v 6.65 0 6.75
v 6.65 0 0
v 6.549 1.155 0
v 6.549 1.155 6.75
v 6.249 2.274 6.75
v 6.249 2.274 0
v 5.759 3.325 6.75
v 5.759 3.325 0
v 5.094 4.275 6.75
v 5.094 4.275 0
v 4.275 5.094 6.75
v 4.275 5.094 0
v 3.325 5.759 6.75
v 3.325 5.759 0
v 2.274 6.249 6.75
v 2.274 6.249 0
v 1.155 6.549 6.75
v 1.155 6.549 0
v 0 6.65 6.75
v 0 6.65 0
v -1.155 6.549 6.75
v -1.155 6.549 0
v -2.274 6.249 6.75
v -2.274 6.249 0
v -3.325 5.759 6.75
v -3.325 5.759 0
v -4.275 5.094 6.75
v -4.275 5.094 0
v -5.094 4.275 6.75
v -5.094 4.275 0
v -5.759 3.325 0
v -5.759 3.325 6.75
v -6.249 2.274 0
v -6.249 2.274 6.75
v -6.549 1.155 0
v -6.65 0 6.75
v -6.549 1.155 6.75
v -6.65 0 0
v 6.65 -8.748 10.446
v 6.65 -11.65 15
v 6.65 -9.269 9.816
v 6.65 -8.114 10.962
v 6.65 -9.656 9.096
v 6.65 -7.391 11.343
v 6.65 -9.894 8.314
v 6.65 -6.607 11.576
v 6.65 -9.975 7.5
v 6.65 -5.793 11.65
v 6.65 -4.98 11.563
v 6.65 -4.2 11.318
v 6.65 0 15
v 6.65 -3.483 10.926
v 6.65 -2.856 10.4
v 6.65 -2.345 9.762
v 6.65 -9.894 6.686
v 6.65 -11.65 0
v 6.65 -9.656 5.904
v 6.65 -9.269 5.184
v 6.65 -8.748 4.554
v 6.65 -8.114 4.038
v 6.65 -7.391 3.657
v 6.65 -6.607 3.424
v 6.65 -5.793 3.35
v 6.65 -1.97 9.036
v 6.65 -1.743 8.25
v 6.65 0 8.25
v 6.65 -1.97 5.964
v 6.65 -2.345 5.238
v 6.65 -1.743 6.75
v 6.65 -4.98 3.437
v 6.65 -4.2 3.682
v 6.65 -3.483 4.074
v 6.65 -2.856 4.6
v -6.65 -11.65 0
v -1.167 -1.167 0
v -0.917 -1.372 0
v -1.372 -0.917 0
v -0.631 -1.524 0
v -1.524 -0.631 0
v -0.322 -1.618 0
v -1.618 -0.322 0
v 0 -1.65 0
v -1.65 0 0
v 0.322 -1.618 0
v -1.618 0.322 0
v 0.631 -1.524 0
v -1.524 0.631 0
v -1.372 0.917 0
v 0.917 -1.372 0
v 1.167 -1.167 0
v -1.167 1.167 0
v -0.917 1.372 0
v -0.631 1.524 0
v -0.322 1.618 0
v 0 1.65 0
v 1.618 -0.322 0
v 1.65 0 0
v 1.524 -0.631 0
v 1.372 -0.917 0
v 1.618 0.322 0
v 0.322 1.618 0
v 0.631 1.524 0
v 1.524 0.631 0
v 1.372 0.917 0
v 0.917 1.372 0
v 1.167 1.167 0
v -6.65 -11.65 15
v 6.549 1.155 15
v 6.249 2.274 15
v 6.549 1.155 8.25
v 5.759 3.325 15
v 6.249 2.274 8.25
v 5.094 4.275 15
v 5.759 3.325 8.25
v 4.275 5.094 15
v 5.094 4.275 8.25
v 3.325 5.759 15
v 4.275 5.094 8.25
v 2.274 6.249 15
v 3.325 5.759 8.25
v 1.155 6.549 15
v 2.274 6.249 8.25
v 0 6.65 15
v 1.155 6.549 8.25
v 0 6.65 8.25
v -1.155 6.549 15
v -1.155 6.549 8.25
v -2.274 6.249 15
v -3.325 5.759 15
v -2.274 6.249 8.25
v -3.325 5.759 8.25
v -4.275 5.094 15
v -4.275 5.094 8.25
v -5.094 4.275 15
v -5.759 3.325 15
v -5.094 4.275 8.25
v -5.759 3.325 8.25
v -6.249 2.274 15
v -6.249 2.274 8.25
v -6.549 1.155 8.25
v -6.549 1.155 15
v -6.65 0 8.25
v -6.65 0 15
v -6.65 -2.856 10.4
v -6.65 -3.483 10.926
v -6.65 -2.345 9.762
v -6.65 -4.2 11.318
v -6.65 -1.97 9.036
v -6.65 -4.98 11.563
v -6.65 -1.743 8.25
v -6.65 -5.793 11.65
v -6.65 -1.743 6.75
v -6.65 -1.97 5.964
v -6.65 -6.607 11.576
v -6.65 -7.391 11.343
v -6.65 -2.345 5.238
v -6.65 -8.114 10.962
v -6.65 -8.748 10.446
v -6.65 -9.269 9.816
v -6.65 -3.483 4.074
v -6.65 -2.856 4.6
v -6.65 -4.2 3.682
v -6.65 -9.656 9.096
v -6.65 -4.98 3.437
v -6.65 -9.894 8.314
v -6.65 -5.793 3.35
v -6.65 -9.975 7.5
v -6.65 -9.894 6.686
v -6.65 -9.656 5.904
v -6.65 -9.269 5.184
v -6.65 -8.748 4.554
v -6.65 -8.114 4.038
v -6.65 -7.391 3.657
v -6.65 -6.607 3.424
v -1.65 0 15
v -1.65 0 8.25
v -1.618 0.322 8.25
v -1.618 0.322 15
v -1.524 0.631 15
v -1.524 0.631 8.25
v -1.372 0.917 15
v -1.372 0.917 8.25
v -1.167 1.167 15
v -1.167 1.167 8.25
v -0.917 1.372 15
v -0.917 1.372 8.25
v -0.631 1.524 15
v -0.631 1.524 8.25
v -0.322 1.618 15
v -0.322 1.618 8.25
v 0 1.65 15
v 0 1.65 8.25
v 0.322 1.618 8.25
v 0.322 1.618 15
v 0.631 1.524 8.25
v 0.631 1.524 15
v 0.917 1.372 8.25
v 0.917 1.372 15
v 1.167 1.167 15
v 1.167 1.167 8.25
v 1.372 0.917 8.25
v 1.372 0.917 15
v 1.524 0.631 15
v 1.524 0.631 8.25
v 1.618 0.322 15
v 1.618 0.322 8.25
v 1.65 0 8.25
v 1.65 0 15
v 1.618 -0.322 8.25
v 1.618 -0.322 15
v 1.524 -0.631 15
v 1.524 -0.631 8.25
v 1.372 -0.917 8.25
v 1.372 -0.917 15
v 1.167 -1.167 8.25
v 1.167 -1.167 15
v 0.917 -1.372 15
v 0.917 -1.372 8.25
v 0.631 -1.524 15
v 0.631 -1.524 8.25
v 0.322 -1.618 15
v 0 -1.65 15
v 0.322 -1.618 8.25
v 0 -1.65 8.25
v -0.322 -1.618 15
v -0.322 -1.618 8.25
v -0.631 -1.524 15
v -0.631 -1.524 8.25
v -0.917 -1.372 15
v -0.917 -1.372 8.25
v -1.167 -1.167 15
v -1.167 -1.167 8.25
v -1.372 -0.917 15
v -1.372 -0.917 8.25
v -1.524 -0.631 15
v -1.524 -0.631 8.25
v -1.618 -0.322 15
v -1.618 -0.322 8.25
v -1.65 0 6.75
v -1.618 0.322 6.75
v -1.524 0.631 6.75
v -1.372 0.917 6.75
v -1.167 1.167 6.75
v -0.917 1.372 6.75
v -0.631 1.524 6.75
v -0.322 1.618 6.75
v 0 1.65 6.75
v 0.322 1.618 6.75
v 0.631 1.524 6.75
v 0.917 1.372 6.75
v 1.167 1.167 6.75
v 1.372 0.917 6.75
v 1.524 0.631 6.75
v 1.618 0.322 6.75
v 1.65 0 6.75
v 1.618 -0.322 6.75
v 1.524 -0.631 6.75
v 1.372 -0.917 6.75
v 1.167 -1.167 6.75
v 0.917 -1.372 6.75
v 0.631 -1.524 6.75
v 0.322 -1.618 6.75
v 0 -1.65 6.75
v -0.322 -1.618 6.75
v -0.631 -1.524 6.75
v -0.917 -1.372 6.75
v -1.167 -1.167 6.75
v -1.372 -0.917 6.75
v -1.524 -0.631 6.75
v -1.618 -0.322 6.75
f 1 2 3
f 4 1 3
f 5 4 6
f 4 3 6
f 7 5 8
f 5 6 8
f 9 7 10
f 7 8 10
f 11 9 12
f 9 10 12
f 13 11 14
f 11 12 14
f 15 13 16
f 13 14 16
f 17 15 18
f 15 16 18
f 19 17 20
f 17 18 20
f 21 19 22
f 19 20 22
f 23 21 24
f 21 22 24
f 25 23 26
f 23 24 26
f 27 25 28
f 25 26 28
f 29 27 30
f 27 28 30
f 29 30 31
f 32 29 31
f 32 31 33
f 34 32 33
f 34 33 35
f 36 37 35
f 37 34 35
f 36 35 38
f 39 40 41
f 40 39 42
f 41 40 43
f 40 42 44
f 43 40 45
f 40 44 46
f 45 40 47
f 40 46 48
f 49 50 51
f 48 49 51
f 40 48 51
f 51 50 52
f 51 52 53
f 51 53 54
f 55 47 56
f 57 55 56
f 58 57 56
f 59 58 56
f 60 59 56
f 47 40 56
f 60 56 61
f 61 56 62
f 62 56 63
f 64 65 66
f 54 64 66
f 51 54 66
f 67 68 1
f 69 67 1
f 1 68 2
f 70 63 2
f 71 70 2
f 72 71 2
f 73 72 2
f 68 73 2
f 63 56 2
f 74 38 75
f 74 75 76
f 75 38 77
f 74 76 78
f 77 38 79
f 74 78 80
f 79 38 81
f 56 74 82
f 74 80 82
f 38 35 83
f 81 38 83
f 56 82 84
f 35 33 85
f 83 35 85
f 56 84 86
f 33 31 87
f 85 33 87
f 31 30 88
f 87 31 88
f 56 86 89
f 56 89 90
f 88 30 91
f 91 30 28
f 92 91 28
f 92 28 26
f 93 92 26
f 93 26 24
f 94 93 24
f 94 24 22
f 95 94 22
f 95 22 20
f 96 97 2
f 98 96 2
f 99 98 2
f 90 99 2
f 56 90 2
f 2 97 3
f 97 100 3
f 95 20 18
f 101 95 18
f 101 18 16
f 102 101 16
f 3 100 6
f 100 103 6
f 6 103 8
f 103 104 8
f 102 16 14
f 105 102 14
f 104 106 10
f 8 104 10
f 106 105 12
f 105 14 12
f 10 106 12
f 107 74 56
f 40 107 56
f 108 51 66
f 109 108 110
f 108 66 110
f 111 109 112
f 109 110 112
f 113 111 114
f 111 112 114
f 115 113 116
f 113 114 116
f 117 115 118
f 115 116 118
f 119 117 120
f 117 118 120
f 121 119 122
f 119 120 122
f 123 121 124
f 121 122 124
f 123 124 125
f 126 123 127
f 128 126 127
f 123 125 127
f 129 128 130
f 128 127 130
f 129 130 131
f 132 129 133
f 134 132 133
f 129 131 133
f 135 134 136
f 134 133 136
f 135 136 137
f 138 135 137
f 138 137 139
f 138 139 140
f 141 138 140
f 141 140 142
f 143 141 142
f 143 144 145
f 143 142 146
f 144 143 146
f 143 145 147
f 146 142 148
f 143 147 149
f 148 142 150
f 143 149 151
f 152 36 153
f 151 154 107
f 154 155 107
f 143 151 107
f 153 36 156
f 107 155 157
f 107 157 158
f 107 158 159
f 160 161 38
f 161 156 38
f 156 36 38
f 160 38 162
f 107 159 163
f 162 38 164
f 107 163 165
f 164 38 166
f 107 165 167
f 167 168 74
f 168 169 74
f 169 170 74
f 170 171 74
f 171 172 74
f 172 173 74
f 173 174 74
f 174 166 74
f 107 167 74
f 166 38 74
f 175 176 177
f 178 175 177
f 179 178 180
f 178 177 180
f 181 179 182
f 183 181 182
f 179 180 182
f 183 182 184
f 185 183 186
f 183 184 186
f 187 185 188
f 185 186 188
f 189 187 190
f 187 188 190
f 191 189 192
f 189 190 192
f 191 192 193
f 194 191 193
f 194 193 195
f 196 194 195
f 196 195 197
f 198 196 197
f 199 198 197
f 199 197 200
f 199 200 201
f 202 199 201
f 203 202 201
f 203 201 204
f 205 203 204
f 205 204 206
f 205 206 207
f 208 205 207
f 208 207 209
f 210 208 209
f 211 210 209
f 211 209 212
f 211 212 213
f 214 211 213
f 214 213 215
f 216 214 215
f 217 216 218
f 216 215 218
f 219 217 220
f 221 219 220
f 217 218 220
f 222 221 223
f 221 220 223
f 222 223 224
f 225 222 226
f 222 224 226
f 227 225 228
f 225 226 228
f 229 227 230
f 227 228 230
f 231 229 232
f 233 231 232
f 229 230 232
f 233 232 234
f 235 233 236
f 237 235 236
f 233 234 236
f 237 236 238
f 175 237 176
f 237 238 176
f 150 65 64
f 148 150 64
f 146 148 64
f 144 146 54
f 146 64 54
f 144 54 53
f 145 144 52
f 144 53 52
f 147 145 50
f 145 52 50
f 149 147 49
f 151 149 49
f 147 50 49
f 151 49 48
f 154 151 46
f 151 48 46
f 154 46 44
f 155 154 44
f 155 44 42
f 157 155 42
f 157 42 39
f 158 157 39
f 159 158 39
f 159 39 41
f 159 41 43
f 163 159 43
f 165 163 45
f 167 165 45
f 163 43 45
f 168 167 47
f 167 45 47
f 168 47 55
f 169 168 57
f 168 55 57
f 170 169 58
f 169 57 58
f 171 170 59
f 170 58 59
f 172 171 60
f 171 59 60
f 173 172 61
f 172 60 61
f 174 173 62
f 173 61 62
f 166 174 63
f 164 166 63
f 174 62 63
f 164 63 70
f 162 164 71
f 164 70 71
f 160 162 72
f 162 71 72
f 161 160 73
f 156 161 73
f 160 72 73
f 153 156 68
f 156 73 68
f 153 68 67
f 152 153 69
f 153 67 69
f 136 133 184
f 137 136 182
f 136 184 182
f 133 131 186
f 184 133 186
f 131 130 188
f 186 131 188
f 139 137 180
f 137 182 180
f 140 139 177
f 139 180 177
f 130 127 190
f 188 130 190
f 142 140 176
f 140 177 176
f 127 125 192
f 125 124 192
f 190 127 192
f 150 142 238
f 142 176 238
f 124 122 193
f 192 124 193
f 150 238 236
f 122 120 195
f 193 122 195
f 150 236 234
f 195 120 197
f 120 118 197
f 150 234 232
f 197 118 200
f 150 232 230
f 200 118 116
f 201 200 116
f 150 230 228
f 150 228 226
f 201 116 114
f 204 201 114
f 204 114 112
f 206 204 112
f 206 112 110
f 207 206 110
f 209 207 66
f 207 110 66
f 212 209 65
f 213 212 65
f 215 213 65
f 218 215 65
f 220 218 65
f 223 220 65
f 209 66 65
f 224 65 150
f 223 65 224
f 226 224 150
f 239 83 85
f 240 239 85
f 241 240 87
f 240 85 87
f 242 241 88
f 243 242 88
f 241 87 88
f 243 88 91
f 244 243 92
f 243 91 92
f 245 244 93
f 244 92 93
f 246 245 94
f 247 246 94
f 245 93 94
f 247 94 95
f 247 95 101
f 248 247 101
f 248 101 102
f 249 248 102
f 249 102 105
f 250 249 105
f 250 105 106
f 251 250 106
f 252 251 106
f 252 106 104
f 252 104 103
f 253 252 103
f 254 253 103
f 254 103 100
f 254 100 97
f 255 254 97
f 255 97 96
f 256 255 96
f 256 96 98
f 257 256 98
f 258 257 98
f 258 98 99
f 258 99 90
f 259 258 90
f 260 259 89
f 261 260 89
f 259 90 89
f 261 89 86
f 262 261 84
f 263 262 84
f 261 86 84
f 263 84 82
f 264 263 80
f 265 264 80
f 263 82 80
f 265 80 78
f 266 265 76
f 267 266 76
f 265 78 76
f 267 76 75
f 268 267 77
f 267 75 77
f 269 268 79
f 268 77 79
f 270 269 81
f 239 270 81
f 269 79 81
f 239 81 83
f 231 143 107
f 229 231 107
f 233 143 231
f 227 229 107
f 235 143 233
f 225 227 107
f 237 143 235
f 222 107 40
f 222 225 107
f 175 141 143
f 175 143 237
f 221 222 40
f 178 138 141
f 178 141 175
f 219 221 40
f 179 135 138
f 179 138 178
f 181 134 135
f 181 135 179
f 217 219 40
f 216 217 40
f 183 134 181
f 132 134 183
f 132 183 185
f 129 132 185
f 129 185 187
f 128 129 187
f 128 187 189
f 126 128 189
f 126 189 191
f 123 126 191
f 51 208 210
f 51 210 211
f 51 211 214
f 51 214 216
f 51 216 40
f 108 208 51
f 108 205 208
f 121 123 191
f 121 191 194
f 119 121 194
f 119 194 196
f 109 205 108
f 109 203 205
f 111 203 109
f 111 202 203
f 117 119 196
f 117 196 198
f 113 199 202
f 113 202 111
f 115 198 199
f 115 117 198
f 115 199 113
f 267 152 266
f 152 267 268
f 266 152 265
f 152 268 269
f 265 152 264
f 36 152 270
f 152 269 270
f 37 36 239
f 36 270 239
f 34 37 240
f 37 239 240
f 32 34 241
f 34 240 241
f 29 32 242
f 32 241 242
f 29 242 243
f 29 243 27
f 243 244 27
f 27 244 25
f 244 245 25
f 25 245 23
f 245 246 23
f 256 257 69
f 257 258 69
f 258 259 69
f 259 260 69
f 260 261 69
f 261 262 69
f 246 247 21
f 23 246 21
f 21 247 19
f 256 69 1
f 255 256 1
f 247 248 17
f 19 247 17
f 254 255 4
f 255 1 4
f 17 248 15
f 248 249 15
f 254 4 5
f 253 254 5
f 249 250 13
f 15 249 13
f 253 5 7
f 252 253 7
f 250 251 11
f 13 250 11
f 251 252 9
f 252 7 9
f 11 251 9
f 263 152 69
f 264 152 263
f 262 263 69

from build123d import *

# Parameters (mm, degrees)
F1_DEPTH = 15
F3_DEPTH = 13.3


with BuildPart() as f1:
    # F0 (on Top) → F1 (new body)
    with BuildSketch(Plane.XY):
        with BuildLine():
            Line((6.65, 0), (1.65, 0))
            ThreePointArc((1.65, 0), (0, -1.65), (-1.65, 0))
            Line((-1.65, 0), (-6.65, 0))
            ThreePointArc((-6.65, 0), (0, -6.65), (6.65, 0))
        make_face()
        with BuildLine():
            ThreePointArc((-1.65, 0), (0, 1.65), (1.65, 0))
            Line((1.65, 0), (6.65, 0))
            ThreePointArc((6.65, 0), (0, 6.65), (-6.65, 0))
            Line((-6.65, 0), (-1.65, 0))
        make_face()
        with BuildLine():
            Line((6.65, -11.65), (6.65, 0))
            ThreePointArc((6.65, 0), (0, -6.65), (-6.65, 0))
            Line((-6.65, 0), (-6.65, -11.65))
            Line((-6.65, -11.65), (6.65, -11.65))
        make_face()
    extrude(amount=F1_DEPTH)

    # F2 (on face) → F3 (cut, through all)
    with BuildSketch(Plane.YZ.offset(6.65)):
        with BuildLine():
            ThreePointArc((-1.7433336736, 6.75), (-1.6921187257, 7.1234467199), (-1.675, 7.5))
            ThreePointArc((-1.675, 7.5), (-1.6921187257, 7.8765532801), (-1.7433336736, 8.25))
            Line((-1.7433336736, 8.25), (-1.7433336736, 6.75))
        make_face()
        with BuildLine():
            ThreePointArc((-1.7433336736, 8.25), (-1.6921187257, 7.8765532801), (-1.675, 7.5))
            ThreePointArc((-1.675, 7.5), (-1.6921187257, 7.1234467199), (-1.7433336736, 6.75))
            Line((-1.7433336736, 6.75), (9.3667274341, 6.75))
            Line((9.3667274341, 6.75), (9.3667274341, 8.25))
            Line((9.3667274341, 8.25), (-1.7433336736, 8.25))
        make_face()
        with BuildLine():
            Line((-1.7433336736, 6.75), (-1.7433336736, 8.25))
            ThreePointArc((-1.7433336736, 8.25), (-9.975, 7.5), (-1.7433336736, 6.75))
        make_face()
    extrude(amount=-F3_DEPTH, mode=Mode.SUBTRACT)


solid = f1.part
